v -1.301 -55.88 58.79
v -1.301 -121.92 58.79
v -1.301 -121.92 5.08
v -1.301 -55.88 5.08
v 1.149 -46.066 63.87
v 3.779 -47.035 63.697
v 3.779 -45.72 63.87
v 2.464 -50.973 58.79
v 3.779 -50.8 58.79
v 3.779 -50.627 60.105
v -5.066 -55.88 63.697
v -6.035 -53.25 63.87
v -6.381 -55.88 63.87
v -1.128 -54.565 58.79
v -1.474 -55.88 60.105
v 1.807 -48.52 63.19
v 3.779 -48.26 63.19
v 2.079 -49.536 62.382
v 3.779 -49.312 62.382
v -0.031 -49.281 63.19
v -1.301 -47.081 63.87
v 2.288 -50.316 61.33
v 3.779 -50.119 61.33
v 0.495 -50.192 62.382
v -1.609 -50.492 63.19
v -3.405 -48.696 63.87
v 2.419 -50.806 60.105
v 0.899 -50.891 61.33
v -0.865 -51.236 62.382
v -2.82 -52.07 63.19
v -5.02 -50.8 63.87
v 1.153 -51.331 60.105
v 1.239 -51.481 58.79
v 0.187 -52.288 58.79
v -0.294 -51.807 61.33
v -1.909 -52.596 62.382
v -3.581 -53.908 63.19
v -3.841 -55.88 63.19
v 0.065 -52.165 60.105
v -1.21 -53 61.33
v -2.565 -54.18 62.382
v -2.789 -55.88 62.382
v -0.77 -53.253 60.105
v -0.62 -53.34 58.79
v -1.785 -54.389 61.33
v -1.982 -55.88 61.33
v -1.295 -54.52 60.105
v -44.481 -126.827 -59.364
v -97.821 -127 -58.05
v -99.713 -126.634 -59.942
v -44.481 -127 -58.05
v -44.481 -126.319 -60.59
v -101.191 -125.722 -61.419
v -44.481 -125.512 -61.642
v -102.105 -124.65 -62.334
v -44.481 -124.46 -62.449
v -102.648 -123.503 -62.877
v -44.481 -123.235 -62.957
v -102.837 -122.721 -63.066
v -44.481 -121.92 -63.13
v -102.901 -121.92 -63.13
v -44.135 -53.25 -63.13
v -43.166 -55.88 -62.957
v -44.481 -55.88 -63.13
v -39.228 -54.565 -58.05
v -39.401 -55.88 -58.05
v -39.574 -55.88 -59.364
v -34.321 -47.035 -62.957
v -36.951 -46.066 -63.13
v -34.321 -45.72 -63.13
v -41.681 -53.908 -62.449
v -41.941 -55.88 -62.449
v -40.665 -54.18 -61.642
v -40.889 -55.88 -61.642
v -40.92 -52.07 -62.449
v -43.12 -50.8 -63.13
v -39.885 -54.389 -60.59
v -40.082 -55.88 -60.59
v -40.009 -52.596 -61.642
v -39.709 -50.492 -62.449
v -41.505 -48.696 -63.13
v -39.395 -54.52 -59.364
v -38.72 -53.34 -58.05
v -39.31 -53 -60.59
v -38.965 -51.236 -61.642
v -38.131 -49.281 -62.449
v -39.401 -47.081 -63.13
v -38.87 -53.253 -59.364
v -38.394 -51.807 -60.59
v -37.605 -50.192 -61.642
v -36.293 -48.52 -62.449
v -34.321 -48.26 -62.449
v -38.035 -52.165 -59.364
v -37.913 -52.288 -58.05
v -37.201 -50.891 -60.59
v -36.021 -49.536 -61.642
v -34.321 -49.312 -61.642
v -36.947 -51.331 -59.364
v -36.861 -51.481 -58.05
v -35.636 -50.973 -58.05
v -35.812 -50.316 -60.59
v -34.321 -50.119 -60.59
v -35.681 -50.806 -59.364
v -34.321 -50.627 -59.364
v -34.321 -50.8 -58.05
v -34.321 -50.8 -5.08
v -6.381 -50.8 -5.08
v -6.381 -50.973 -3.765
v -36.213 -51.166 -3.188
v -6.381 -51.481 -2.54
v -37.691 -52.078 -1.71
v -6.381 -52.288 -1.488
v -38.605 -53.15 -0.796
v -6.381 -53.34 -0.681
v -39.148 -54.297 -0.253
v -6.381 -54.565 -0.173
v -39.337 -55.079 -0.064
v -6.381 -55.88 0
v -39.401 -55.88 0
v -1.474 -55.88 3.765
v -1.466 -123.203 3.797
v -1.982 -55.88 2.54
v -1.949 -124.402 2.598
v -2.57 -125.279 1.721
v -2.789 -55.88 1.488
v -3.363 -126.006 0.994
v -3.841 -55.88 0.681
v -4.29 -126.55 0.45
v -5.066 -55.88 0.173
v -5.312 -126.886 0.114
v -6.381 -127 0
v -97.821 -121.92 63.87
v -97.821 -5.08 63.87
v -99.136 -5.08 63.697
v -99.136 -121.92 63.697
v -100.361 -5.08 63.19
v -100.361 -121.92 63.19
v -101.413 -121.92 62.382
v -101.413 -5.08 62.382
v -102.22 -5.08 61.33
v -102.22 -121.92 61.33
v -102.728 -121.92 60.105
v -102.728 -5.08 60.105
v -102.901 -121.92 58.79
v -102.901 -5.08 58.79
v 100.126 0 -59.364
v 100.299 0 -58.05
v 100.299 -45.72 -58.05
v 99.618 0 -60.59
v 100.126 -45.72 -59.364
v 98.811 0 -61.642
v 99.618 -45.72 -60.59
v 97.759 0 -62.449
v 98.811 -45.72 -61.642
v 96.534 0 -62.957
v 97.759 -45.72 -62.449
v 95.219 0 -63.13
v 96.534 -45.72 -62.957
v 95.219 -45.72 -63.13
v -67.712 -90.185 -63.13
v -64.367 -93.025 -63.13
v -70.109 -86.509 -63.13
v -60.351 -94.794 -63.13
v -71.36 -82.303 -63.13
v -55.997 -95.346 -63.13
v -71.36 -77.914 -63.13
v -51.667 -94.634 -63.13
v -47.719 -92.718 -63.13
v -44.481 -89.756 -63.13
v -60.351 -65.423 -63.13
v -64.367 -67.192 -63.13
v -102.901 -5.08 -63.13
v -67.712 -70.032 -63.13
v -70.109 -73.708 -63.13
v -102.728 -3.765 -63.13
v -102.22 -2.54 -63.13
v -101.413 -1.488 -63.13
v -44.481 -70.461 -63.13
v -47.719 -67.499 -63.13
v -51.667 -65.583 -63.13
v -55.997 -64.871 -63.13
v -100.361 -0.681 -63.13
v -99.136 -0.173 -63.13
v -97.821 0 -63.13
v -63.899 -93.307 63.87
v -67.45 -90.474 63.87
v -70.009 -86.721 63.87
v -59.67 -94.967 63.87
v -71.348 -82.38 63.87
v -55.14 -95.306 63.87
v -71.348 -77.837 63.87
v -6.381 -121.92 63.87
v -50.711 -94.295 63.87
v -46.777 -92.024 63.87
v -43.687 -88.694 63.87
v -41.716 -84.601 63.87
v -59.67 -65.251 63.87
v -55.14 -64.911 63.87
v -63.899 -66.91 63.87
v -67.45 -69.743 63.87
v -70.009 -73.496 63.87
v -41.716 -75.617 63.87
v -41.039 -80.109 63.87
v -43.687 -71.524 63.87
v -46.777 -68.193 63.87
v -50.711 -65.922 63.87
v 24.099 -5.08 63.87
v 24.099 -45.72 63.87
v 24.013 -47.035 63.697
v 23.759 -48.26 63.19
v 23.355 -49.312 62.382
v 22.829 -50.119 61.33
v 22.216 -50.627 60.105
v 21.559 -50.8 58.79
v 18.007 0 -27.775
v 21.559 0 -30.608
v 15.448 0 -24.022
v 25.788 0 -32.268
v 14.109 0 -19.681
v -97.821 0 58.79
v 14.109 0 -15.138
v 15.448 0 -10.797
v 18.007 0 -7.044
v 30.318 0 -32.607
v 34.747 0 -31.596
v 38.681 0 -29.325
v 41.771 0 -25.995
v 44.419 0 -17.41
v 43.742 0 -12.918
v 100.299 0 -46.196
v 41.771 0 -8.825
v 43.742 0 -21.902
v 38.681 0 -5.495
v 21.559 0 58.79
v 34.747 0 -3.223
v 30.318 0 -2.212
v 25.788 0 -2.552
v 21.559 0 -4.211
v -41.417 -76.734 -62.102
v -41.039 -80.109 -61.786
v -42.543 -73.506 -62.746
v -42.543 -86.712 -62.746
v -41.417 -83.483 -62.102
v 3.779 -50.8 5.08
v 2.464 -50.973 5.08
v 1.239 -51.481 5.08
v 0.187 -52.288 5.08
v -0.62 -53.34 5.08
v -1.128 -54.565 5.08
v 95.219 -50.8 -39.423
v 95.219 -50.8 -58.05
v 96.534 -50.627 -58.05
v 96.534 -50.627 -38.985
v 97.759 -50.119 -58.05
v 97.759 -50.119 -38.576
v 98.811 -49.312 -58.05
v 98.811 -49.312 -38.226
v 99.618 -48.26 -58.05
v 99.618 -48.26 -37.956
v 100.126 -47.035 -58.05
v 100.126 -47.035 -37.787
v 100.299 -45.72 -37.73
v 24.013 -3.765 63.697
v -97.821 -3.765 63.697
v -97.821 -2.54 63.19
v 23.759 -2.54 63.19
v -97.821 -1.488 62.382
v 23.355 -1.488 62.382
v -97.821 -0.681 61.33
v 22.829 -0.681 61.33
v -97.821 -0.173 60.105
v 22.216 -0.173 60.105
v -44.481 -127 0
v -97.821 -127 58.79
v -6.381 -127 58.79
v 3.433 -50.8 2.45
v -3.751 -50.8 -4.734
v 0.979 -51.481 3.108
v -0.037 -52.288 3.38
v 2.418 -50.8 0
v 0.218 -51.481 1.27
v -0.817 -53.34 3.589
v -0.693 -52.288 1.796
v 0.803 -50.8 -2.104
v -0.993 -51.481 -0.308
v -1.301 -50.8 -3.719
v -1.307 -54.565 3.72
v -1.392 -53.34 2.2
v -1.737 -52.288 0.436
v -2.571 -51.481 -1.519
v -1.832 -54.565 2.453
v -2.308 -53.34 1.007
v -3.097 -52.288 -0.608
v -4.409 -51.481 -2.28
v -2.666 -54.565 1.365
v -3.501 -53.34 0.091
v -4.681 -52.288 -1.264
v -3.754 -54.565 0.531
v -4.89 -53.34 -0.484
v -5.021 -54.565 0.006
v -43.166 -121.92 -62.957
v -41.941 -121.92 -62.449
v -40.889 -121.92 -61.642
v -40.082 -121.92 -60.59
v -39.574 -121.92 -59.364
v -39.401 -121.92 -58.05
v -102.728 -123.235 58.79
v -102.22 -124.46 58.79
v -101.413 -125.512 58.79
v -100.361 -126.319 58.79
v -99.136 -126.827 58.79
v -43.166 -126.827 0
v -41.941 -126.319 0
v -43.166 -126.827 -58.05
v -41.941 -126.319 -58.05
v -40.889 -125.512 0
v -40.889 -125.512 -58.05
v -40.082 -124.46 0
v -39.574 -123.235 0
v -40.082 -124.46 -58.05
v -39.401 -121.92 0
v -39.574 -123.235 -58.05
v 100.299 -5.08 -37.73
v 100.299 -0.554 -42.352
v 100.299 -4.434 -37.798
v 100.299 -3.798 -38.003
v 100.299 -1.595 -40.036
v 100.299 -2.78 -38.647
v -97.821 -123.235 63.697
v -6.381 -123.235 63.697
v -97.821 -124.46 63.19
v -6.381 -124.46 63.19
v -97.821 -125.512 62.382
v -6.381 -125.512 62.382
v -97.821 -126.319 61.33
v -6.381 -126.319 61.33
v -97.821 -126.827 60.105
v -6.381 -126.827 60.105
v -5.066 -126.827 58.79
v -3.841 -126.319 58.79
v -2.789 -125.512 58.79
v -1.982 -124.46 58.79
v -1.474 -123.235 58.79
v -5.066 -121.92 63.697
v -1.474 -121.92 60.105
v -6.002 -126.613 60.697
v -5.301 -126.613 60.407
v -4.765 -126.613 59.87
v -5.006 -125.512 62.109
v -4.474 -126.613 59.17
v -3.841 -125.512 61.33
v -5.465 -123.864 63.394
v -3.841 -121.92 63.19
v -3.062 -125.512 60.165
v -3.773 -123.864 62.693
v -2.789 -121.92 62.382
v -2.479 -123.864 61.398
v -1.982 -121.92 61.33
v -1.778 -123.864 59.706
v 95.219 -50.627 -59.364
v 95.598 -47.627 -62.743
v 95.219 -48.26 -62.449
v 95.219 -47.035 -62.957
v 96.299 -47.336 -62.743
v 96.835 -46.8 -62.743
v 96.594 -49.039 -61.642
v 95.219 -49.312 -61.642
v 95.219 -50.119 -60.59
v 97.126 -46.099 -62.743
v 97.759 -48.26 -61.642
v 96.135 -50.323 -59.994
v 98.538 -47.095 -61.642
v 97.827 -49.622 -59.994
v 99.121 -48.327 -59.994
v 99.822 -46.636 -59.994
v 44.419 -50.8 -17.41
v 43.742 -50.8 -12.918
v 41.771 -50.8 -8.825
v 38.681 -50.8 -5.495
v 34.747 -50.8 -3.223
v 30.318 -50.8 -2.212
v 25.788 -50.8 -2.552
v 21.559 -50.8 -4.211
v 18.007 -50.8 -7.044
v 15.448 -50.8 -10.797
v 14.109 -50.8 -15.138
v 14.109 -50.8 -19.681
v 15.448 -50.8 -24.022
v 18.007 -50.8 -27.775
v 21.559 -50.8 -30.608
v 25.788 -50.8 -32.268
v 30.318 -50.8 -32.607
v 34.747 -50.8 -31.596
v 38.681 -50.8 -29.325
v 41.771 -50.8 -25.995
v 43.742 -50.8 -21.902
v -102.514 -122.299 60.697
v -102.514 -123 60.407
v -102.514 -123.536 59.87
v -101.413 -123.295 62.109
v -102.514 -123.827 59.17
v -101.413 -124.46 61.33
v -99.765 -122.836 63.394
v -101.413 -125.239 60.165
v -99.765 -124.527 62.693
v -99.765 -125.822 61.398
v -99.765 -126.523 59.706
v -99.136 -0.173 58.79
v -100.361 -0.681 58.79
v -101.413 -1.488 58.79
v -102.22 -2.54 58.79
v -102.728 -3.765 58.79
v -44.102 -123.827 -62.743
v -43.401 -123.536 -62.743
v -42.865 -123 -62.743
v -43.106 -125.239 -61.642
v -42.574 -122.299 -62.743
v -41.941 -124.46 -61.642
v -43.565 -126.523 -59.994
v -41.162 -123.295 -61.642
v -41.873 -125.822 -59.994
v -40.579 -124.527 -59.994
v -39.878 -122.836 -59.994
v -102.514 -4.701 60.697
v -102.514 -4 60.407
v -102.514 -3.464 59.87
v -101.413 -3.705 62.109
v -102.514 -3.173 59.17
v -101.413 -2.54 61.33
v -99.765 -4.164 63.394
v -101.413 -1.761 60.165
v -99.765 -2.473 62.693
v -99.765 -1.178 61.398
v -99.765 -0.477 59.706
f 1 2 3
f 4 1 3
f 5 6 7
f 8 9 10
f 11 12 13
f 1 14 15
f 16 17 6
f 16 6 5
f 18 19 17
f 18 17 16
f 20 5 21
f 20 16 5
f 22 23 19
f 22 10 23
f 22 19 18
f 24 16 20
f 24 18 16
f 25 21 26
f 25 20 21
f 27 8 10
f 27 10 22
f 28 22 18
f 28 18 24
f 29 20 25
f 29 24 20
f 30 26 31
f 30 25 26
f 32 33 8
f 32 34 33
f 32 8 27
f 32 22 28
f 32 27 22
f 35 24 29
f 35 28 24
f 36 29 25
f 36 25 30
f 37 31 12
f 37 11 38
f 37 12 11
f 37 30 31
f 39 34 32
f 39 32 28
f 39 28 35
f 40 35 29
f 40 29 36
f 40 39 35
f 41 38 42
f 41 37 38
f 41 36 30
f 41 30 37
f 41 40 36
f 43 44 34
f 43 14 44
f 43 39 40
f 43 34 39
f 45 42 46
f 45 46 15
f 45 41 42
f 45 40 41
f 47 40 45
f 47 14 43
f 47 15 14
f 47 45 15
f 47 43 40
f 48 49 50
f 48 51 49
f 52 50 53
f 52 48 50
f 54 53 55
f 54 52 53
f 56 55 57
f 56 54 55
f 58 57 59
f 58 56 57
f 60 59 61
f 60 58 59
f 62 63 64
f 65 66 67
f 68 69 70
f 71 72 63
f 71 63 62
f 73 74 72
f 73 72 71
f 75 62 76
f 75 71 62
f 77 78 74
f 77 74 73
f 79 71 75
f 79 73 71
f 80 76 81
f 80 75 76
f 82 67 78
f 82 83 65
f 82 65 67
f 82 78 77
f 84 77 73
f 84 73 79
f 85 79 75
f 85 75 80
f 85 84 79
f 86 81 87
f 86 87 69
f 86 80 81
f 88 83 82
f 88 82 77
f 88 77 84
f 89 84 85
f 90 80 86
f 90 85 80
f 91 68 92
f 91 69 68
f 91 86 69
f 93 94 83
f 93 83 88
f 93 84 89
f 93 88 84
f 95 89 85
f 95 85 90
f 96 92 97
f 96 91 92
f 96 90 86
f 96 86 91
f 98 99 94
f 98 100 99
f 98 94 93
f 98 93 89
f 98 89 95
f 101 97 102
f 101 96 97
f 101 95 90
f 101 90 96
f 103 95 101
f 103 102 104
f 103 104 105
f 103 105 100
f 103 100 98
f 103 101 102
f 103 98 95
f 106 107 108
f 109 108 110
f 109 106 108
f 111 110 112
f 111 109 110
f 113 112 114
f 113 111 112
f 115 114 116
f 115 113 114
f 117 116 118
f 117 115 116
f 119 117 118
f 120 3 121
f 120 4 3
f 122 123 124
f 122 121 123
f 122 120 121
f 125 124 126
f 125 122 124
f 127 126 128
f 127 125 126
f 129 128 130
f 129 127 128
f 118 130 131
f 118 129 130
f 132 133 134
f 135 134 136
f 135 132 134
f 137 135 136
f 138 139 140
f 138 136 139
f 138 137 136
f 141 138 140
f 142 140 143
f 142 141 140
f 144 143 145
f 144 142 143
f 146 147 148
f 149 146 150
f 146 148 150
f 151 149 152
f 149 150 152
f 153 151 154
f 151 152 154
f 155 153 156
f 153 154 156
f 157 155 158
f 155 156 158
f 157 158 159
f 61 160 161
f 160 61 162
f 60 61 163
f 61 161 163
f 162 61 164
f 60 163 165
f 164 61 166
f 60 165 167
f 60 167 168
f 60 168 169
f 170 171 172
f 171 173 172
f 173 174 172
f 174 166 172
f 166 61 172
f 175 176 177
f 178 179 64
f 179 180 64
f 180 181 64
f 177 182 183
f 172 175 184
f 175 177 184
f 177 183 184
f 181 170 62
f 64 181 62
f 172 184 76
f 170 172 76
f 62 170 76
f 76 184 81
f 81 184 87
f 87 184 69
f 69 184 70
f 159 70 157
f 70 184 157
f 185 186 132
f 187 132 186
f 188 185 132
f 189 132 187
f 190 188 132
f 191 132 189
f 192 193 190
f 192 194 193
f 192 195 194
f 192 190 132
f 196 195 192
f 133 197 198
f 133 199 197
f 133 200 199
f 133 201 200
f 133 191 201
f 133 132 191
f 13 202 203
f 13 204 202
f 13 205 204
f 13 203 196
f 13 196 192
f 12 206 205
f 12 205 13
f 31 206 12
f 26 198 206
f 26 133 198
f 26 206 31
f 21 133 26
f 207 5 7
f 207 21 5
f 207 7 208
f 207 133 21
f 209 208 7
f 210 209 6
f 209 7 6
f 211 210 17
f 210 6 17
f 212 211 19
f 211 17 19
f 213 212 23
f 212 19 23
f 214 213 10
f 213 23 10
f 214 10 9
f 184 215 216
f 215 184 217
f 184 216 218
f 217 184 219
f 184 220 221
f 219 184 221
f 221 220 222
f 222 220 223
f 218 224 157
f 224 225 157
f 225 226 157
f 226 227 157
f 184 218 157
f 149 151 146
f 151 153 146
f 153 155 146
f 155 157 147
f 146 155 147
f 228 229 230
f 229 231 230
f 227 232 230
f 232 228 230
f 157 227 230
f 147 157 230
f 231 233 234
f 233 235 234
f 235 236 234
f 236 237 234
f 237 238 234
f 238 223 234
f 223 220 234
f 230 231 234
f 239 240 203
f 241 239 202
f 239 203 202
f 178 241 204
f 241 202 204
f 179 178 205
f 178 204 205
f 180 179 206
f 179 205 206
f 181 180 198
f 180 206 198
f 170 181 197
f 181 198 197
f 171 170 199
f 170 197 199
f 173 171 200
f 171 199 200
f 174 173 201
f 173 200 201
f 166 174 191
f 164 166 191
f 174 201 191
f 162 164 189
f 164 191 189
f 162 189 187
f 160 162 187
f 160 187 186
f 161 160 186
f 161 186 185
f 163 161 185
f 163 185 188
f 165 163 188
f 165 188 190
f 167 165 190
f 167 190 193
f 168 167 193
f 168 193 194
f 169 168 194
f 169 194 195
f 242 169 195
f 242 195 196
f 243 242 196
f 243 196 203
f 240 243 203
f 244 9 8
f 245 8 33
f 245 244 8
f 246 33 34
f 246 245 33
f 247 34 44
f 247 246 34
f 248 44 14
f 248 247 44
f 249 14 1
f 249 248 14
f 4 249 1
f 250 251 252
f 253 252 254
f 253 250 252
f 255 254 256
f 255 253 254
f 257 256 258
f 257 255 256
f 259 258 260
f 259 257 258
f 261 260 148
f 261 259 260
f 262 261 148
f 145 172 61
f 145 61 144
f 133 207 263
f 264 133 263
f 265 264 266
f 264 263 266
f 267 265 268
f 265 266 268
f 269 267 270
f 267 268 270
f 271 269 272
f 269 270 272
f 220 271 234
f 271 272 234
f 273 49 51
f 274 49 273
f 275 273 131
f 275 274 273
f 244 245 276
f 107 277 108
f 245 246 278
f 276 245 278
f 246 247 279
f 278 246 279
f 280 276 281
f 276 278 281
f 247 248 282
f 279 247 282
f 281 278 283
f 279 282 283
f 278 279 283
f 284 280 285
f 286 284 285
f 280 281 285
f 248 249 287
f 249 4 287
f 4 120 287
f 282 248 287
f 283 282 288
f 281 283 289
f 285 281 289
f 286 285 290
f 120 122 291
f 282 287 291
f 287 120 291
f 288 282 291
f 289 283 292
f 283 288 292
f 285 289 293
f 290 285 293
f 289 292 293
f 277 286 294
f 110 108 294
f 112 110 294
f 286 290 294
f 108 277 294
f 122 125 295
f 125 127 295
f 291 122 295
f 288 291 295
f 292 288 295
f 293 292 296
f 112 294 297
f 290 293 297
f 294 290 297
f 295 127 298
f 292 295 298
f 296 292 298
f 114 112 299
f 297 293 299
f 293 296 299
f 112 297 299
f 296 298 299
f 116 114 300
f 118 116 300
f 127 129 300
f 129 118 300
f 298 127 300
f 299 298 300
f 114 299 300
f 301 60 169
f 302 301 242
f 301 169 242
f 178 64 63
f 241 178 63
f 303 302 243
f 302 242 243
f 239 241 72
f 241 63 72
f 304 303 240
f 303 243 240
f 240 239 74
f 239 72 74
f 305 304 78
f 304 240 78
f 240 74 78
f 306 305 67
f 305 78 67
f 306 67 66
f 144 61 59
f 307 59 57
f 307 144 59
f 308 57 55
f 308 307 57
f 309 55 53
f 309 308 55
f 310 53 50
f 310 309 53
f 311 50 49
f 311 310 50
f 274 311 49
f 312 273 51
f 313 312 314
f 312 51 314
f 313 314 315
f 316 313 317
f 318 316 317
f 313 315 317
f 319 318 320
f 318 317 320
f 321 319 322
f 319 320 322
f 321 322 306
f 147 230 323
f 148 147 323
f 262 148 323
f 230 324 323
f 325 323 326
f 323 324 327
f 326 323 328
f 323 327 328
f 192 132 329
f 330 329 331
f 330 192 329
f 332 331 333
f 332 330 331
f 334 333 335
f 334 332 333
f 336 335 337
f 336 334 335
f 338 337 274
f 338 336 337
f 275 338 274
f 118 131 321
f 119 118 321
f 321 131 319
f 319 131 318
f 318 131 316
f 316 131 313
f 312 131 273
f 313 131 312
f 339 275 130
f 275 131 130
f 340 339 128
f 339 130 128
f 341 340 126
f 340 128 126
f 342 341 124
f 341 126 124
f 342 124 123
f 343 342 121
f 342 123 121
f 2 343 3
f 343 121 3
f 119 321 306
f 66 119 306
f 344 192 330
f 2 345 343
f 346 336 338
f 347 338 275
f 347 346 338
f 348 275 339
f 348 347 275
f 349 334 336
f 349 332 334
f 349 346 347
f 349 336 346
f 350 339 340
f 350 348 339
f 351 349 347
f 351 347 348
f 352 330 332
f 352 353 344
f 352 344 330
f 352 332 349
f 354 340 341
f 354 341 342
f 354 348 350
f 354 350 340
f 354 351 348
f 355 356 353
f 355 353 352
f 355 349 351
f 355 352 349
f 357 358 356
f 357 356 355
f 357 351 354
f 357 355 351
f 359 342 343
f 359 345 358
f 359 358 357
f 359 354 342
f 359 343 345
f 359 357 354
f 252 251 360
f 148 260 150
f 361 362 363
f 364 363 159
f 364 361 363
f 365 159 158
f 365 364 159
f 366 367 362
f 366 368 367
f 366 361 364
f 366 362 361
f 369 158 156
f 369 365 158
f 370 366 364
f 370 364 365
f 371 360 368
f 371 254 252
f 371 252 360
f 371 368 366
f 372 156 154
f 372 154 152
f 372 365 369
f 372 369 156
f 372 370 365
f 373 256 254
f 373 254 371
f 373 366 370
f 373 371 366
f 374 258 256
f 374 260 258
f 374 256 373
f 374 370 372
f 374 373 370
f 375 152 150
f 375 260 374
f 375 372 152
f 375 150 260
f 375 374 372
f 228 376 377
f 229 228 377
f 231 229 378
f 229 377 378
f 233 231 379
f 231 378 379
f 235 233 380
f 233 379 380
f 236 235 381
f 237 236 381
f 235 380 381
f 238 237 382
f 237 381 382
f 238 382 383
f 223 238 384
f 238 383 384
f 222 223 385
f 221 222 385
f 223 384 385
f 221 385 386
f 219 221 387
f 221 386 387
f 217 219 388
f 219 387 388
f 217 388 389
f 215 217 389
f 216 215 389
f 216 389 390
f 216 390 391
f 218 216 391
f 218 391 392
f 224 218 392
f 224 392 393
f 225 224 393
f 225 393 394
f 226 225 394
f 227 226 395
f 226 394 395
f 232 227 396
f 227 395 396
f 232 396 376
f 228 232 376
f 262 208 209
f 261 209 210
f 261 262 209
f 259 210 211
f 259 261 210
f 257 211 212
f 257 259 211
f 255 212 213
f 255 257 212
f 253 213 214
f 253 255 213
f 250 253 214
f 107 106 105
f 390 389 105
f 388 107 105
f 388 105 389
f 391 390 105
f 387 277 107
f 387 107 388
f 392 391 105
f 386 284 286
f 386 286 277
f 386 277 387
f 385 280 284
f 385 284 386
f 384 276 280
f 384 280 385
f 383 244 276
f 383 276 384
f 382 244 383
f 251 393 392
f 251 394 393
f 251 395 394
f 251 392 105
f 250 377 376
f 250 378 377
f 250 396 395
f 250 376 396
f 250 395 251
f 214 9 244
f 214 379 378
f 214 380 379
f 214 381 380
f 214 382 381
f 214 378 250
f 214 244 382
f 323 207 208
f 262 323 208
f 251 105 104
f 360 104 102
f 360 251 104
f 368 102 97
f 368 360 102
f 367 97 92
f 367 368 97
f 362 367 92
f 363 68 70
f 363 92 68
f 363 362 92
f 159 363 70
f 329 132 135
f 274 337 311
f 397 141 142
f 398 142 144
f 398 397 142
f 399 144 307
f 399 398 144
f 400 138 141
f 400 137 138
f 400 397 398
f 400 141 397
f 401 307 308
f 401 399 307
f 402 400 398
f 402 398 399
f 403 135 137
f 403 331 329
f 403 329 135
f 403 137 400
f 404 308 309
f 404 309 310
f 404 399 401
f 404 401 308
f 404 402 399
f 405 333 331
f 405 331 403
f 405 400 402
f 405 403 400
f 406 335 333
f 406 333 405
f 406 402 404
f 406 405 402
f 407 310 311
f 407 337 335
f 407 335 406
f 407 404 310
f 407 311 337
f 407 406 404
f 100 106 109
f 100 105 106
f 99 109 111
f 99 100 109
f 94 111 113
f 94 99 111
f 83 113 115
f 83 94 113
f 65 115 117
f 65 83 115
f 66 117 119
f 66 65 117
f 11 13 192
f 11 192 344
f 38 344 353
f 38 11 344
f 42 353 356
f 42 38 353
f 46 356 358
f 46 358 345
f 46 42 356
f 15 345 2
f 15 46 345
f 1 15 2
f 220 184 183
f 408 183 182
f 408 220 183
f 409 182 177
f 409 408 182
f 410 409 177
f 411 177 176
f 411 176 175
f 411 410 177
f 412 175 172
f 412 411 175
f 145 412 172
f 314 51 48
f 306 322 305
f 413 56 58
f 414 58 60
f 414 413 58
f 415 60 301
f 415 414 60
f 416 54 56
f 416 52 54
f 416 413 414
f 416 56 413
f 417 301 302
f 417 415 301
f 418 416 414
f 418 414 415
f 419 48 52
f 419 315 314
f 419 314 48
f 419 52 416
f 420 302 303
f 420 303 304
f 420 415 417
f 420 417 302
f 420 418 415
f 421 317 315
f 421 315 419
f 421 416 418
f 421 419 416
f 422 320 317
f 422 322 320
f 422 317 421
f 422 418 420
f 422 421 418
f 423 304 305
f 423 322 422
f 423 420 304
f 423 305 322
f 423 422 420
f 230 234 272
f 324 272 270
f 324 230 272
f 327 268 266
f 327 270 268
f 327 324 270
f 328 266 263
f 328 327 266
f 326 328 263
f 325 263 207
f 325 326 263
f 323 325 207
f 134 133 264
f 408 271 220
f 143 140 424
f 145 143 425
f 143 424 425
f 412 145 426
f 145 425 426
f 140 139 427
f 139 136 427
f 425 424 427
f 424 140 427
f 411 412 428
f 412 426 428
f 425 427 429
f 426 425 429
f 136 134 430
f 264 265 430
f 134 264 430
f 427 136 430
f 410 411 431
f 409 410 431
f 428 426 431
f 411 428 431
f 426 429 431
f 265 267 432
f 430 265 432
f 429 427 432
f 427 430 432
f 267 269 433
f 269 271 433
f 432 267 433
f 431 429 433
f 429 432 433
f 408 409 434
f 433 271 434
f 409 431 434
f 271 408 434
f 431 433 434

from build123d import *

# Parameters (mm, degrees)
F0_W     = 203.2
F0_H     = 127
F1_DEPTH = 127
F3_DEPTH = 76.2
F4_SIZE2 = 101.6
F4_SIZE  = 76.2
F5_R     = 5.08
F6_R     = 15.24
F7_DEPTH = 50.8
F8_R     = 15.24
F9_DEPTH = 127


with BuildPart() as f1:
    # F0 (on Front) → F1 (new body)
    with BuildSketch(Plane.XZ):
        with Locations((-1.3009174736, 0.3703823313)):
            Rectangle(F0_W, F0_H)
    extrude(amount=F1_DEPTH)

    # F2 (on face) → F3 (cut)
    with BuildSketch(Plane.XZ.offset(127)):
        Polygon((-39.4009174736, 0), (-39.4009174736, -63.1296176687), (100.2990825264, -63.1296176687), (100.2990825264, 63.8703823313), (-1.3009174736, 63.8703823313), (-1.3009174736, 0), align=None)
    extrude(amount=-F3_DEPTH, mode=Mode.SUBTRACT)

    # F4
    f4_edges = [f1.edges().sort_by_distance(p)[0] for p in [
        (100.299083, -25.4, 63.870382),
    ]]
    f4_side = f1.faces().sort_by_distance((-23.072346, -52.614286, 63.870382))[0]
    chamfer(f4_edges, length=F4_SIZE, length2=F4_SIZE2, reference=f4_side)

    # F5
    f5_edges = [f1.edges().sort_by_distance(p)[0] for p in [
        (11.399083, -50.8, 63.870382),
        (-1.300917, -88.9, 63.870382),
        (-52.100917, -127, 63.870382),
        (100.299083, -50.8, -50.429618),
        (62.199083, -50.8, 13.070382),
        (30.449083, -50.8, -63.129618),
        (-39.400917, -50.8, -31.564809),
        (-1.300917, -50.8, 31.935191),
        (-20.350917, -50.8, 0),
        (-1.300917, -127, 31.935191),
        (-1.300917, -88.9, 0),
        (-39.400917, -127, -31.564809),
        (100.299083, -25.4, -63.129618),
        (-71.150917, -127, -63.129618),
        (-39.400917, 0, 63.870382),
        (62.199083, 0, 13.070382),
        (-102.900917, -63.5, 63.870382),
        (-102.900917, -127, 0.370382),
        (-102.900917, 0, 0.370382),
        (-39.400917, -88.9, -63.129618),
    ]]
    fillet(f5_edges, radius=F5_R)

    # F6 (on face) → F7 (cut, through all)
    with BuildSketch(Plane.XZ.offset(50.8)):
        with Locations((29.1790825264, -17.4096176687)):
            Circle(F6_R)
    extrude(amount=-F7_DEPTH, mode=Mode.SUBTRACT)

    # F8 (on face) → F9 (cut, through all)
    with BuildSketch(Plane.XY.offset(63.8703823313)):
        with Locations((-56.2786398957, -80.1086086328)):
            Circle(F8_R)
    extrude(amount=-F9_DEPTH, mode=Mode.SUBTRACT)


solid = f1.part
